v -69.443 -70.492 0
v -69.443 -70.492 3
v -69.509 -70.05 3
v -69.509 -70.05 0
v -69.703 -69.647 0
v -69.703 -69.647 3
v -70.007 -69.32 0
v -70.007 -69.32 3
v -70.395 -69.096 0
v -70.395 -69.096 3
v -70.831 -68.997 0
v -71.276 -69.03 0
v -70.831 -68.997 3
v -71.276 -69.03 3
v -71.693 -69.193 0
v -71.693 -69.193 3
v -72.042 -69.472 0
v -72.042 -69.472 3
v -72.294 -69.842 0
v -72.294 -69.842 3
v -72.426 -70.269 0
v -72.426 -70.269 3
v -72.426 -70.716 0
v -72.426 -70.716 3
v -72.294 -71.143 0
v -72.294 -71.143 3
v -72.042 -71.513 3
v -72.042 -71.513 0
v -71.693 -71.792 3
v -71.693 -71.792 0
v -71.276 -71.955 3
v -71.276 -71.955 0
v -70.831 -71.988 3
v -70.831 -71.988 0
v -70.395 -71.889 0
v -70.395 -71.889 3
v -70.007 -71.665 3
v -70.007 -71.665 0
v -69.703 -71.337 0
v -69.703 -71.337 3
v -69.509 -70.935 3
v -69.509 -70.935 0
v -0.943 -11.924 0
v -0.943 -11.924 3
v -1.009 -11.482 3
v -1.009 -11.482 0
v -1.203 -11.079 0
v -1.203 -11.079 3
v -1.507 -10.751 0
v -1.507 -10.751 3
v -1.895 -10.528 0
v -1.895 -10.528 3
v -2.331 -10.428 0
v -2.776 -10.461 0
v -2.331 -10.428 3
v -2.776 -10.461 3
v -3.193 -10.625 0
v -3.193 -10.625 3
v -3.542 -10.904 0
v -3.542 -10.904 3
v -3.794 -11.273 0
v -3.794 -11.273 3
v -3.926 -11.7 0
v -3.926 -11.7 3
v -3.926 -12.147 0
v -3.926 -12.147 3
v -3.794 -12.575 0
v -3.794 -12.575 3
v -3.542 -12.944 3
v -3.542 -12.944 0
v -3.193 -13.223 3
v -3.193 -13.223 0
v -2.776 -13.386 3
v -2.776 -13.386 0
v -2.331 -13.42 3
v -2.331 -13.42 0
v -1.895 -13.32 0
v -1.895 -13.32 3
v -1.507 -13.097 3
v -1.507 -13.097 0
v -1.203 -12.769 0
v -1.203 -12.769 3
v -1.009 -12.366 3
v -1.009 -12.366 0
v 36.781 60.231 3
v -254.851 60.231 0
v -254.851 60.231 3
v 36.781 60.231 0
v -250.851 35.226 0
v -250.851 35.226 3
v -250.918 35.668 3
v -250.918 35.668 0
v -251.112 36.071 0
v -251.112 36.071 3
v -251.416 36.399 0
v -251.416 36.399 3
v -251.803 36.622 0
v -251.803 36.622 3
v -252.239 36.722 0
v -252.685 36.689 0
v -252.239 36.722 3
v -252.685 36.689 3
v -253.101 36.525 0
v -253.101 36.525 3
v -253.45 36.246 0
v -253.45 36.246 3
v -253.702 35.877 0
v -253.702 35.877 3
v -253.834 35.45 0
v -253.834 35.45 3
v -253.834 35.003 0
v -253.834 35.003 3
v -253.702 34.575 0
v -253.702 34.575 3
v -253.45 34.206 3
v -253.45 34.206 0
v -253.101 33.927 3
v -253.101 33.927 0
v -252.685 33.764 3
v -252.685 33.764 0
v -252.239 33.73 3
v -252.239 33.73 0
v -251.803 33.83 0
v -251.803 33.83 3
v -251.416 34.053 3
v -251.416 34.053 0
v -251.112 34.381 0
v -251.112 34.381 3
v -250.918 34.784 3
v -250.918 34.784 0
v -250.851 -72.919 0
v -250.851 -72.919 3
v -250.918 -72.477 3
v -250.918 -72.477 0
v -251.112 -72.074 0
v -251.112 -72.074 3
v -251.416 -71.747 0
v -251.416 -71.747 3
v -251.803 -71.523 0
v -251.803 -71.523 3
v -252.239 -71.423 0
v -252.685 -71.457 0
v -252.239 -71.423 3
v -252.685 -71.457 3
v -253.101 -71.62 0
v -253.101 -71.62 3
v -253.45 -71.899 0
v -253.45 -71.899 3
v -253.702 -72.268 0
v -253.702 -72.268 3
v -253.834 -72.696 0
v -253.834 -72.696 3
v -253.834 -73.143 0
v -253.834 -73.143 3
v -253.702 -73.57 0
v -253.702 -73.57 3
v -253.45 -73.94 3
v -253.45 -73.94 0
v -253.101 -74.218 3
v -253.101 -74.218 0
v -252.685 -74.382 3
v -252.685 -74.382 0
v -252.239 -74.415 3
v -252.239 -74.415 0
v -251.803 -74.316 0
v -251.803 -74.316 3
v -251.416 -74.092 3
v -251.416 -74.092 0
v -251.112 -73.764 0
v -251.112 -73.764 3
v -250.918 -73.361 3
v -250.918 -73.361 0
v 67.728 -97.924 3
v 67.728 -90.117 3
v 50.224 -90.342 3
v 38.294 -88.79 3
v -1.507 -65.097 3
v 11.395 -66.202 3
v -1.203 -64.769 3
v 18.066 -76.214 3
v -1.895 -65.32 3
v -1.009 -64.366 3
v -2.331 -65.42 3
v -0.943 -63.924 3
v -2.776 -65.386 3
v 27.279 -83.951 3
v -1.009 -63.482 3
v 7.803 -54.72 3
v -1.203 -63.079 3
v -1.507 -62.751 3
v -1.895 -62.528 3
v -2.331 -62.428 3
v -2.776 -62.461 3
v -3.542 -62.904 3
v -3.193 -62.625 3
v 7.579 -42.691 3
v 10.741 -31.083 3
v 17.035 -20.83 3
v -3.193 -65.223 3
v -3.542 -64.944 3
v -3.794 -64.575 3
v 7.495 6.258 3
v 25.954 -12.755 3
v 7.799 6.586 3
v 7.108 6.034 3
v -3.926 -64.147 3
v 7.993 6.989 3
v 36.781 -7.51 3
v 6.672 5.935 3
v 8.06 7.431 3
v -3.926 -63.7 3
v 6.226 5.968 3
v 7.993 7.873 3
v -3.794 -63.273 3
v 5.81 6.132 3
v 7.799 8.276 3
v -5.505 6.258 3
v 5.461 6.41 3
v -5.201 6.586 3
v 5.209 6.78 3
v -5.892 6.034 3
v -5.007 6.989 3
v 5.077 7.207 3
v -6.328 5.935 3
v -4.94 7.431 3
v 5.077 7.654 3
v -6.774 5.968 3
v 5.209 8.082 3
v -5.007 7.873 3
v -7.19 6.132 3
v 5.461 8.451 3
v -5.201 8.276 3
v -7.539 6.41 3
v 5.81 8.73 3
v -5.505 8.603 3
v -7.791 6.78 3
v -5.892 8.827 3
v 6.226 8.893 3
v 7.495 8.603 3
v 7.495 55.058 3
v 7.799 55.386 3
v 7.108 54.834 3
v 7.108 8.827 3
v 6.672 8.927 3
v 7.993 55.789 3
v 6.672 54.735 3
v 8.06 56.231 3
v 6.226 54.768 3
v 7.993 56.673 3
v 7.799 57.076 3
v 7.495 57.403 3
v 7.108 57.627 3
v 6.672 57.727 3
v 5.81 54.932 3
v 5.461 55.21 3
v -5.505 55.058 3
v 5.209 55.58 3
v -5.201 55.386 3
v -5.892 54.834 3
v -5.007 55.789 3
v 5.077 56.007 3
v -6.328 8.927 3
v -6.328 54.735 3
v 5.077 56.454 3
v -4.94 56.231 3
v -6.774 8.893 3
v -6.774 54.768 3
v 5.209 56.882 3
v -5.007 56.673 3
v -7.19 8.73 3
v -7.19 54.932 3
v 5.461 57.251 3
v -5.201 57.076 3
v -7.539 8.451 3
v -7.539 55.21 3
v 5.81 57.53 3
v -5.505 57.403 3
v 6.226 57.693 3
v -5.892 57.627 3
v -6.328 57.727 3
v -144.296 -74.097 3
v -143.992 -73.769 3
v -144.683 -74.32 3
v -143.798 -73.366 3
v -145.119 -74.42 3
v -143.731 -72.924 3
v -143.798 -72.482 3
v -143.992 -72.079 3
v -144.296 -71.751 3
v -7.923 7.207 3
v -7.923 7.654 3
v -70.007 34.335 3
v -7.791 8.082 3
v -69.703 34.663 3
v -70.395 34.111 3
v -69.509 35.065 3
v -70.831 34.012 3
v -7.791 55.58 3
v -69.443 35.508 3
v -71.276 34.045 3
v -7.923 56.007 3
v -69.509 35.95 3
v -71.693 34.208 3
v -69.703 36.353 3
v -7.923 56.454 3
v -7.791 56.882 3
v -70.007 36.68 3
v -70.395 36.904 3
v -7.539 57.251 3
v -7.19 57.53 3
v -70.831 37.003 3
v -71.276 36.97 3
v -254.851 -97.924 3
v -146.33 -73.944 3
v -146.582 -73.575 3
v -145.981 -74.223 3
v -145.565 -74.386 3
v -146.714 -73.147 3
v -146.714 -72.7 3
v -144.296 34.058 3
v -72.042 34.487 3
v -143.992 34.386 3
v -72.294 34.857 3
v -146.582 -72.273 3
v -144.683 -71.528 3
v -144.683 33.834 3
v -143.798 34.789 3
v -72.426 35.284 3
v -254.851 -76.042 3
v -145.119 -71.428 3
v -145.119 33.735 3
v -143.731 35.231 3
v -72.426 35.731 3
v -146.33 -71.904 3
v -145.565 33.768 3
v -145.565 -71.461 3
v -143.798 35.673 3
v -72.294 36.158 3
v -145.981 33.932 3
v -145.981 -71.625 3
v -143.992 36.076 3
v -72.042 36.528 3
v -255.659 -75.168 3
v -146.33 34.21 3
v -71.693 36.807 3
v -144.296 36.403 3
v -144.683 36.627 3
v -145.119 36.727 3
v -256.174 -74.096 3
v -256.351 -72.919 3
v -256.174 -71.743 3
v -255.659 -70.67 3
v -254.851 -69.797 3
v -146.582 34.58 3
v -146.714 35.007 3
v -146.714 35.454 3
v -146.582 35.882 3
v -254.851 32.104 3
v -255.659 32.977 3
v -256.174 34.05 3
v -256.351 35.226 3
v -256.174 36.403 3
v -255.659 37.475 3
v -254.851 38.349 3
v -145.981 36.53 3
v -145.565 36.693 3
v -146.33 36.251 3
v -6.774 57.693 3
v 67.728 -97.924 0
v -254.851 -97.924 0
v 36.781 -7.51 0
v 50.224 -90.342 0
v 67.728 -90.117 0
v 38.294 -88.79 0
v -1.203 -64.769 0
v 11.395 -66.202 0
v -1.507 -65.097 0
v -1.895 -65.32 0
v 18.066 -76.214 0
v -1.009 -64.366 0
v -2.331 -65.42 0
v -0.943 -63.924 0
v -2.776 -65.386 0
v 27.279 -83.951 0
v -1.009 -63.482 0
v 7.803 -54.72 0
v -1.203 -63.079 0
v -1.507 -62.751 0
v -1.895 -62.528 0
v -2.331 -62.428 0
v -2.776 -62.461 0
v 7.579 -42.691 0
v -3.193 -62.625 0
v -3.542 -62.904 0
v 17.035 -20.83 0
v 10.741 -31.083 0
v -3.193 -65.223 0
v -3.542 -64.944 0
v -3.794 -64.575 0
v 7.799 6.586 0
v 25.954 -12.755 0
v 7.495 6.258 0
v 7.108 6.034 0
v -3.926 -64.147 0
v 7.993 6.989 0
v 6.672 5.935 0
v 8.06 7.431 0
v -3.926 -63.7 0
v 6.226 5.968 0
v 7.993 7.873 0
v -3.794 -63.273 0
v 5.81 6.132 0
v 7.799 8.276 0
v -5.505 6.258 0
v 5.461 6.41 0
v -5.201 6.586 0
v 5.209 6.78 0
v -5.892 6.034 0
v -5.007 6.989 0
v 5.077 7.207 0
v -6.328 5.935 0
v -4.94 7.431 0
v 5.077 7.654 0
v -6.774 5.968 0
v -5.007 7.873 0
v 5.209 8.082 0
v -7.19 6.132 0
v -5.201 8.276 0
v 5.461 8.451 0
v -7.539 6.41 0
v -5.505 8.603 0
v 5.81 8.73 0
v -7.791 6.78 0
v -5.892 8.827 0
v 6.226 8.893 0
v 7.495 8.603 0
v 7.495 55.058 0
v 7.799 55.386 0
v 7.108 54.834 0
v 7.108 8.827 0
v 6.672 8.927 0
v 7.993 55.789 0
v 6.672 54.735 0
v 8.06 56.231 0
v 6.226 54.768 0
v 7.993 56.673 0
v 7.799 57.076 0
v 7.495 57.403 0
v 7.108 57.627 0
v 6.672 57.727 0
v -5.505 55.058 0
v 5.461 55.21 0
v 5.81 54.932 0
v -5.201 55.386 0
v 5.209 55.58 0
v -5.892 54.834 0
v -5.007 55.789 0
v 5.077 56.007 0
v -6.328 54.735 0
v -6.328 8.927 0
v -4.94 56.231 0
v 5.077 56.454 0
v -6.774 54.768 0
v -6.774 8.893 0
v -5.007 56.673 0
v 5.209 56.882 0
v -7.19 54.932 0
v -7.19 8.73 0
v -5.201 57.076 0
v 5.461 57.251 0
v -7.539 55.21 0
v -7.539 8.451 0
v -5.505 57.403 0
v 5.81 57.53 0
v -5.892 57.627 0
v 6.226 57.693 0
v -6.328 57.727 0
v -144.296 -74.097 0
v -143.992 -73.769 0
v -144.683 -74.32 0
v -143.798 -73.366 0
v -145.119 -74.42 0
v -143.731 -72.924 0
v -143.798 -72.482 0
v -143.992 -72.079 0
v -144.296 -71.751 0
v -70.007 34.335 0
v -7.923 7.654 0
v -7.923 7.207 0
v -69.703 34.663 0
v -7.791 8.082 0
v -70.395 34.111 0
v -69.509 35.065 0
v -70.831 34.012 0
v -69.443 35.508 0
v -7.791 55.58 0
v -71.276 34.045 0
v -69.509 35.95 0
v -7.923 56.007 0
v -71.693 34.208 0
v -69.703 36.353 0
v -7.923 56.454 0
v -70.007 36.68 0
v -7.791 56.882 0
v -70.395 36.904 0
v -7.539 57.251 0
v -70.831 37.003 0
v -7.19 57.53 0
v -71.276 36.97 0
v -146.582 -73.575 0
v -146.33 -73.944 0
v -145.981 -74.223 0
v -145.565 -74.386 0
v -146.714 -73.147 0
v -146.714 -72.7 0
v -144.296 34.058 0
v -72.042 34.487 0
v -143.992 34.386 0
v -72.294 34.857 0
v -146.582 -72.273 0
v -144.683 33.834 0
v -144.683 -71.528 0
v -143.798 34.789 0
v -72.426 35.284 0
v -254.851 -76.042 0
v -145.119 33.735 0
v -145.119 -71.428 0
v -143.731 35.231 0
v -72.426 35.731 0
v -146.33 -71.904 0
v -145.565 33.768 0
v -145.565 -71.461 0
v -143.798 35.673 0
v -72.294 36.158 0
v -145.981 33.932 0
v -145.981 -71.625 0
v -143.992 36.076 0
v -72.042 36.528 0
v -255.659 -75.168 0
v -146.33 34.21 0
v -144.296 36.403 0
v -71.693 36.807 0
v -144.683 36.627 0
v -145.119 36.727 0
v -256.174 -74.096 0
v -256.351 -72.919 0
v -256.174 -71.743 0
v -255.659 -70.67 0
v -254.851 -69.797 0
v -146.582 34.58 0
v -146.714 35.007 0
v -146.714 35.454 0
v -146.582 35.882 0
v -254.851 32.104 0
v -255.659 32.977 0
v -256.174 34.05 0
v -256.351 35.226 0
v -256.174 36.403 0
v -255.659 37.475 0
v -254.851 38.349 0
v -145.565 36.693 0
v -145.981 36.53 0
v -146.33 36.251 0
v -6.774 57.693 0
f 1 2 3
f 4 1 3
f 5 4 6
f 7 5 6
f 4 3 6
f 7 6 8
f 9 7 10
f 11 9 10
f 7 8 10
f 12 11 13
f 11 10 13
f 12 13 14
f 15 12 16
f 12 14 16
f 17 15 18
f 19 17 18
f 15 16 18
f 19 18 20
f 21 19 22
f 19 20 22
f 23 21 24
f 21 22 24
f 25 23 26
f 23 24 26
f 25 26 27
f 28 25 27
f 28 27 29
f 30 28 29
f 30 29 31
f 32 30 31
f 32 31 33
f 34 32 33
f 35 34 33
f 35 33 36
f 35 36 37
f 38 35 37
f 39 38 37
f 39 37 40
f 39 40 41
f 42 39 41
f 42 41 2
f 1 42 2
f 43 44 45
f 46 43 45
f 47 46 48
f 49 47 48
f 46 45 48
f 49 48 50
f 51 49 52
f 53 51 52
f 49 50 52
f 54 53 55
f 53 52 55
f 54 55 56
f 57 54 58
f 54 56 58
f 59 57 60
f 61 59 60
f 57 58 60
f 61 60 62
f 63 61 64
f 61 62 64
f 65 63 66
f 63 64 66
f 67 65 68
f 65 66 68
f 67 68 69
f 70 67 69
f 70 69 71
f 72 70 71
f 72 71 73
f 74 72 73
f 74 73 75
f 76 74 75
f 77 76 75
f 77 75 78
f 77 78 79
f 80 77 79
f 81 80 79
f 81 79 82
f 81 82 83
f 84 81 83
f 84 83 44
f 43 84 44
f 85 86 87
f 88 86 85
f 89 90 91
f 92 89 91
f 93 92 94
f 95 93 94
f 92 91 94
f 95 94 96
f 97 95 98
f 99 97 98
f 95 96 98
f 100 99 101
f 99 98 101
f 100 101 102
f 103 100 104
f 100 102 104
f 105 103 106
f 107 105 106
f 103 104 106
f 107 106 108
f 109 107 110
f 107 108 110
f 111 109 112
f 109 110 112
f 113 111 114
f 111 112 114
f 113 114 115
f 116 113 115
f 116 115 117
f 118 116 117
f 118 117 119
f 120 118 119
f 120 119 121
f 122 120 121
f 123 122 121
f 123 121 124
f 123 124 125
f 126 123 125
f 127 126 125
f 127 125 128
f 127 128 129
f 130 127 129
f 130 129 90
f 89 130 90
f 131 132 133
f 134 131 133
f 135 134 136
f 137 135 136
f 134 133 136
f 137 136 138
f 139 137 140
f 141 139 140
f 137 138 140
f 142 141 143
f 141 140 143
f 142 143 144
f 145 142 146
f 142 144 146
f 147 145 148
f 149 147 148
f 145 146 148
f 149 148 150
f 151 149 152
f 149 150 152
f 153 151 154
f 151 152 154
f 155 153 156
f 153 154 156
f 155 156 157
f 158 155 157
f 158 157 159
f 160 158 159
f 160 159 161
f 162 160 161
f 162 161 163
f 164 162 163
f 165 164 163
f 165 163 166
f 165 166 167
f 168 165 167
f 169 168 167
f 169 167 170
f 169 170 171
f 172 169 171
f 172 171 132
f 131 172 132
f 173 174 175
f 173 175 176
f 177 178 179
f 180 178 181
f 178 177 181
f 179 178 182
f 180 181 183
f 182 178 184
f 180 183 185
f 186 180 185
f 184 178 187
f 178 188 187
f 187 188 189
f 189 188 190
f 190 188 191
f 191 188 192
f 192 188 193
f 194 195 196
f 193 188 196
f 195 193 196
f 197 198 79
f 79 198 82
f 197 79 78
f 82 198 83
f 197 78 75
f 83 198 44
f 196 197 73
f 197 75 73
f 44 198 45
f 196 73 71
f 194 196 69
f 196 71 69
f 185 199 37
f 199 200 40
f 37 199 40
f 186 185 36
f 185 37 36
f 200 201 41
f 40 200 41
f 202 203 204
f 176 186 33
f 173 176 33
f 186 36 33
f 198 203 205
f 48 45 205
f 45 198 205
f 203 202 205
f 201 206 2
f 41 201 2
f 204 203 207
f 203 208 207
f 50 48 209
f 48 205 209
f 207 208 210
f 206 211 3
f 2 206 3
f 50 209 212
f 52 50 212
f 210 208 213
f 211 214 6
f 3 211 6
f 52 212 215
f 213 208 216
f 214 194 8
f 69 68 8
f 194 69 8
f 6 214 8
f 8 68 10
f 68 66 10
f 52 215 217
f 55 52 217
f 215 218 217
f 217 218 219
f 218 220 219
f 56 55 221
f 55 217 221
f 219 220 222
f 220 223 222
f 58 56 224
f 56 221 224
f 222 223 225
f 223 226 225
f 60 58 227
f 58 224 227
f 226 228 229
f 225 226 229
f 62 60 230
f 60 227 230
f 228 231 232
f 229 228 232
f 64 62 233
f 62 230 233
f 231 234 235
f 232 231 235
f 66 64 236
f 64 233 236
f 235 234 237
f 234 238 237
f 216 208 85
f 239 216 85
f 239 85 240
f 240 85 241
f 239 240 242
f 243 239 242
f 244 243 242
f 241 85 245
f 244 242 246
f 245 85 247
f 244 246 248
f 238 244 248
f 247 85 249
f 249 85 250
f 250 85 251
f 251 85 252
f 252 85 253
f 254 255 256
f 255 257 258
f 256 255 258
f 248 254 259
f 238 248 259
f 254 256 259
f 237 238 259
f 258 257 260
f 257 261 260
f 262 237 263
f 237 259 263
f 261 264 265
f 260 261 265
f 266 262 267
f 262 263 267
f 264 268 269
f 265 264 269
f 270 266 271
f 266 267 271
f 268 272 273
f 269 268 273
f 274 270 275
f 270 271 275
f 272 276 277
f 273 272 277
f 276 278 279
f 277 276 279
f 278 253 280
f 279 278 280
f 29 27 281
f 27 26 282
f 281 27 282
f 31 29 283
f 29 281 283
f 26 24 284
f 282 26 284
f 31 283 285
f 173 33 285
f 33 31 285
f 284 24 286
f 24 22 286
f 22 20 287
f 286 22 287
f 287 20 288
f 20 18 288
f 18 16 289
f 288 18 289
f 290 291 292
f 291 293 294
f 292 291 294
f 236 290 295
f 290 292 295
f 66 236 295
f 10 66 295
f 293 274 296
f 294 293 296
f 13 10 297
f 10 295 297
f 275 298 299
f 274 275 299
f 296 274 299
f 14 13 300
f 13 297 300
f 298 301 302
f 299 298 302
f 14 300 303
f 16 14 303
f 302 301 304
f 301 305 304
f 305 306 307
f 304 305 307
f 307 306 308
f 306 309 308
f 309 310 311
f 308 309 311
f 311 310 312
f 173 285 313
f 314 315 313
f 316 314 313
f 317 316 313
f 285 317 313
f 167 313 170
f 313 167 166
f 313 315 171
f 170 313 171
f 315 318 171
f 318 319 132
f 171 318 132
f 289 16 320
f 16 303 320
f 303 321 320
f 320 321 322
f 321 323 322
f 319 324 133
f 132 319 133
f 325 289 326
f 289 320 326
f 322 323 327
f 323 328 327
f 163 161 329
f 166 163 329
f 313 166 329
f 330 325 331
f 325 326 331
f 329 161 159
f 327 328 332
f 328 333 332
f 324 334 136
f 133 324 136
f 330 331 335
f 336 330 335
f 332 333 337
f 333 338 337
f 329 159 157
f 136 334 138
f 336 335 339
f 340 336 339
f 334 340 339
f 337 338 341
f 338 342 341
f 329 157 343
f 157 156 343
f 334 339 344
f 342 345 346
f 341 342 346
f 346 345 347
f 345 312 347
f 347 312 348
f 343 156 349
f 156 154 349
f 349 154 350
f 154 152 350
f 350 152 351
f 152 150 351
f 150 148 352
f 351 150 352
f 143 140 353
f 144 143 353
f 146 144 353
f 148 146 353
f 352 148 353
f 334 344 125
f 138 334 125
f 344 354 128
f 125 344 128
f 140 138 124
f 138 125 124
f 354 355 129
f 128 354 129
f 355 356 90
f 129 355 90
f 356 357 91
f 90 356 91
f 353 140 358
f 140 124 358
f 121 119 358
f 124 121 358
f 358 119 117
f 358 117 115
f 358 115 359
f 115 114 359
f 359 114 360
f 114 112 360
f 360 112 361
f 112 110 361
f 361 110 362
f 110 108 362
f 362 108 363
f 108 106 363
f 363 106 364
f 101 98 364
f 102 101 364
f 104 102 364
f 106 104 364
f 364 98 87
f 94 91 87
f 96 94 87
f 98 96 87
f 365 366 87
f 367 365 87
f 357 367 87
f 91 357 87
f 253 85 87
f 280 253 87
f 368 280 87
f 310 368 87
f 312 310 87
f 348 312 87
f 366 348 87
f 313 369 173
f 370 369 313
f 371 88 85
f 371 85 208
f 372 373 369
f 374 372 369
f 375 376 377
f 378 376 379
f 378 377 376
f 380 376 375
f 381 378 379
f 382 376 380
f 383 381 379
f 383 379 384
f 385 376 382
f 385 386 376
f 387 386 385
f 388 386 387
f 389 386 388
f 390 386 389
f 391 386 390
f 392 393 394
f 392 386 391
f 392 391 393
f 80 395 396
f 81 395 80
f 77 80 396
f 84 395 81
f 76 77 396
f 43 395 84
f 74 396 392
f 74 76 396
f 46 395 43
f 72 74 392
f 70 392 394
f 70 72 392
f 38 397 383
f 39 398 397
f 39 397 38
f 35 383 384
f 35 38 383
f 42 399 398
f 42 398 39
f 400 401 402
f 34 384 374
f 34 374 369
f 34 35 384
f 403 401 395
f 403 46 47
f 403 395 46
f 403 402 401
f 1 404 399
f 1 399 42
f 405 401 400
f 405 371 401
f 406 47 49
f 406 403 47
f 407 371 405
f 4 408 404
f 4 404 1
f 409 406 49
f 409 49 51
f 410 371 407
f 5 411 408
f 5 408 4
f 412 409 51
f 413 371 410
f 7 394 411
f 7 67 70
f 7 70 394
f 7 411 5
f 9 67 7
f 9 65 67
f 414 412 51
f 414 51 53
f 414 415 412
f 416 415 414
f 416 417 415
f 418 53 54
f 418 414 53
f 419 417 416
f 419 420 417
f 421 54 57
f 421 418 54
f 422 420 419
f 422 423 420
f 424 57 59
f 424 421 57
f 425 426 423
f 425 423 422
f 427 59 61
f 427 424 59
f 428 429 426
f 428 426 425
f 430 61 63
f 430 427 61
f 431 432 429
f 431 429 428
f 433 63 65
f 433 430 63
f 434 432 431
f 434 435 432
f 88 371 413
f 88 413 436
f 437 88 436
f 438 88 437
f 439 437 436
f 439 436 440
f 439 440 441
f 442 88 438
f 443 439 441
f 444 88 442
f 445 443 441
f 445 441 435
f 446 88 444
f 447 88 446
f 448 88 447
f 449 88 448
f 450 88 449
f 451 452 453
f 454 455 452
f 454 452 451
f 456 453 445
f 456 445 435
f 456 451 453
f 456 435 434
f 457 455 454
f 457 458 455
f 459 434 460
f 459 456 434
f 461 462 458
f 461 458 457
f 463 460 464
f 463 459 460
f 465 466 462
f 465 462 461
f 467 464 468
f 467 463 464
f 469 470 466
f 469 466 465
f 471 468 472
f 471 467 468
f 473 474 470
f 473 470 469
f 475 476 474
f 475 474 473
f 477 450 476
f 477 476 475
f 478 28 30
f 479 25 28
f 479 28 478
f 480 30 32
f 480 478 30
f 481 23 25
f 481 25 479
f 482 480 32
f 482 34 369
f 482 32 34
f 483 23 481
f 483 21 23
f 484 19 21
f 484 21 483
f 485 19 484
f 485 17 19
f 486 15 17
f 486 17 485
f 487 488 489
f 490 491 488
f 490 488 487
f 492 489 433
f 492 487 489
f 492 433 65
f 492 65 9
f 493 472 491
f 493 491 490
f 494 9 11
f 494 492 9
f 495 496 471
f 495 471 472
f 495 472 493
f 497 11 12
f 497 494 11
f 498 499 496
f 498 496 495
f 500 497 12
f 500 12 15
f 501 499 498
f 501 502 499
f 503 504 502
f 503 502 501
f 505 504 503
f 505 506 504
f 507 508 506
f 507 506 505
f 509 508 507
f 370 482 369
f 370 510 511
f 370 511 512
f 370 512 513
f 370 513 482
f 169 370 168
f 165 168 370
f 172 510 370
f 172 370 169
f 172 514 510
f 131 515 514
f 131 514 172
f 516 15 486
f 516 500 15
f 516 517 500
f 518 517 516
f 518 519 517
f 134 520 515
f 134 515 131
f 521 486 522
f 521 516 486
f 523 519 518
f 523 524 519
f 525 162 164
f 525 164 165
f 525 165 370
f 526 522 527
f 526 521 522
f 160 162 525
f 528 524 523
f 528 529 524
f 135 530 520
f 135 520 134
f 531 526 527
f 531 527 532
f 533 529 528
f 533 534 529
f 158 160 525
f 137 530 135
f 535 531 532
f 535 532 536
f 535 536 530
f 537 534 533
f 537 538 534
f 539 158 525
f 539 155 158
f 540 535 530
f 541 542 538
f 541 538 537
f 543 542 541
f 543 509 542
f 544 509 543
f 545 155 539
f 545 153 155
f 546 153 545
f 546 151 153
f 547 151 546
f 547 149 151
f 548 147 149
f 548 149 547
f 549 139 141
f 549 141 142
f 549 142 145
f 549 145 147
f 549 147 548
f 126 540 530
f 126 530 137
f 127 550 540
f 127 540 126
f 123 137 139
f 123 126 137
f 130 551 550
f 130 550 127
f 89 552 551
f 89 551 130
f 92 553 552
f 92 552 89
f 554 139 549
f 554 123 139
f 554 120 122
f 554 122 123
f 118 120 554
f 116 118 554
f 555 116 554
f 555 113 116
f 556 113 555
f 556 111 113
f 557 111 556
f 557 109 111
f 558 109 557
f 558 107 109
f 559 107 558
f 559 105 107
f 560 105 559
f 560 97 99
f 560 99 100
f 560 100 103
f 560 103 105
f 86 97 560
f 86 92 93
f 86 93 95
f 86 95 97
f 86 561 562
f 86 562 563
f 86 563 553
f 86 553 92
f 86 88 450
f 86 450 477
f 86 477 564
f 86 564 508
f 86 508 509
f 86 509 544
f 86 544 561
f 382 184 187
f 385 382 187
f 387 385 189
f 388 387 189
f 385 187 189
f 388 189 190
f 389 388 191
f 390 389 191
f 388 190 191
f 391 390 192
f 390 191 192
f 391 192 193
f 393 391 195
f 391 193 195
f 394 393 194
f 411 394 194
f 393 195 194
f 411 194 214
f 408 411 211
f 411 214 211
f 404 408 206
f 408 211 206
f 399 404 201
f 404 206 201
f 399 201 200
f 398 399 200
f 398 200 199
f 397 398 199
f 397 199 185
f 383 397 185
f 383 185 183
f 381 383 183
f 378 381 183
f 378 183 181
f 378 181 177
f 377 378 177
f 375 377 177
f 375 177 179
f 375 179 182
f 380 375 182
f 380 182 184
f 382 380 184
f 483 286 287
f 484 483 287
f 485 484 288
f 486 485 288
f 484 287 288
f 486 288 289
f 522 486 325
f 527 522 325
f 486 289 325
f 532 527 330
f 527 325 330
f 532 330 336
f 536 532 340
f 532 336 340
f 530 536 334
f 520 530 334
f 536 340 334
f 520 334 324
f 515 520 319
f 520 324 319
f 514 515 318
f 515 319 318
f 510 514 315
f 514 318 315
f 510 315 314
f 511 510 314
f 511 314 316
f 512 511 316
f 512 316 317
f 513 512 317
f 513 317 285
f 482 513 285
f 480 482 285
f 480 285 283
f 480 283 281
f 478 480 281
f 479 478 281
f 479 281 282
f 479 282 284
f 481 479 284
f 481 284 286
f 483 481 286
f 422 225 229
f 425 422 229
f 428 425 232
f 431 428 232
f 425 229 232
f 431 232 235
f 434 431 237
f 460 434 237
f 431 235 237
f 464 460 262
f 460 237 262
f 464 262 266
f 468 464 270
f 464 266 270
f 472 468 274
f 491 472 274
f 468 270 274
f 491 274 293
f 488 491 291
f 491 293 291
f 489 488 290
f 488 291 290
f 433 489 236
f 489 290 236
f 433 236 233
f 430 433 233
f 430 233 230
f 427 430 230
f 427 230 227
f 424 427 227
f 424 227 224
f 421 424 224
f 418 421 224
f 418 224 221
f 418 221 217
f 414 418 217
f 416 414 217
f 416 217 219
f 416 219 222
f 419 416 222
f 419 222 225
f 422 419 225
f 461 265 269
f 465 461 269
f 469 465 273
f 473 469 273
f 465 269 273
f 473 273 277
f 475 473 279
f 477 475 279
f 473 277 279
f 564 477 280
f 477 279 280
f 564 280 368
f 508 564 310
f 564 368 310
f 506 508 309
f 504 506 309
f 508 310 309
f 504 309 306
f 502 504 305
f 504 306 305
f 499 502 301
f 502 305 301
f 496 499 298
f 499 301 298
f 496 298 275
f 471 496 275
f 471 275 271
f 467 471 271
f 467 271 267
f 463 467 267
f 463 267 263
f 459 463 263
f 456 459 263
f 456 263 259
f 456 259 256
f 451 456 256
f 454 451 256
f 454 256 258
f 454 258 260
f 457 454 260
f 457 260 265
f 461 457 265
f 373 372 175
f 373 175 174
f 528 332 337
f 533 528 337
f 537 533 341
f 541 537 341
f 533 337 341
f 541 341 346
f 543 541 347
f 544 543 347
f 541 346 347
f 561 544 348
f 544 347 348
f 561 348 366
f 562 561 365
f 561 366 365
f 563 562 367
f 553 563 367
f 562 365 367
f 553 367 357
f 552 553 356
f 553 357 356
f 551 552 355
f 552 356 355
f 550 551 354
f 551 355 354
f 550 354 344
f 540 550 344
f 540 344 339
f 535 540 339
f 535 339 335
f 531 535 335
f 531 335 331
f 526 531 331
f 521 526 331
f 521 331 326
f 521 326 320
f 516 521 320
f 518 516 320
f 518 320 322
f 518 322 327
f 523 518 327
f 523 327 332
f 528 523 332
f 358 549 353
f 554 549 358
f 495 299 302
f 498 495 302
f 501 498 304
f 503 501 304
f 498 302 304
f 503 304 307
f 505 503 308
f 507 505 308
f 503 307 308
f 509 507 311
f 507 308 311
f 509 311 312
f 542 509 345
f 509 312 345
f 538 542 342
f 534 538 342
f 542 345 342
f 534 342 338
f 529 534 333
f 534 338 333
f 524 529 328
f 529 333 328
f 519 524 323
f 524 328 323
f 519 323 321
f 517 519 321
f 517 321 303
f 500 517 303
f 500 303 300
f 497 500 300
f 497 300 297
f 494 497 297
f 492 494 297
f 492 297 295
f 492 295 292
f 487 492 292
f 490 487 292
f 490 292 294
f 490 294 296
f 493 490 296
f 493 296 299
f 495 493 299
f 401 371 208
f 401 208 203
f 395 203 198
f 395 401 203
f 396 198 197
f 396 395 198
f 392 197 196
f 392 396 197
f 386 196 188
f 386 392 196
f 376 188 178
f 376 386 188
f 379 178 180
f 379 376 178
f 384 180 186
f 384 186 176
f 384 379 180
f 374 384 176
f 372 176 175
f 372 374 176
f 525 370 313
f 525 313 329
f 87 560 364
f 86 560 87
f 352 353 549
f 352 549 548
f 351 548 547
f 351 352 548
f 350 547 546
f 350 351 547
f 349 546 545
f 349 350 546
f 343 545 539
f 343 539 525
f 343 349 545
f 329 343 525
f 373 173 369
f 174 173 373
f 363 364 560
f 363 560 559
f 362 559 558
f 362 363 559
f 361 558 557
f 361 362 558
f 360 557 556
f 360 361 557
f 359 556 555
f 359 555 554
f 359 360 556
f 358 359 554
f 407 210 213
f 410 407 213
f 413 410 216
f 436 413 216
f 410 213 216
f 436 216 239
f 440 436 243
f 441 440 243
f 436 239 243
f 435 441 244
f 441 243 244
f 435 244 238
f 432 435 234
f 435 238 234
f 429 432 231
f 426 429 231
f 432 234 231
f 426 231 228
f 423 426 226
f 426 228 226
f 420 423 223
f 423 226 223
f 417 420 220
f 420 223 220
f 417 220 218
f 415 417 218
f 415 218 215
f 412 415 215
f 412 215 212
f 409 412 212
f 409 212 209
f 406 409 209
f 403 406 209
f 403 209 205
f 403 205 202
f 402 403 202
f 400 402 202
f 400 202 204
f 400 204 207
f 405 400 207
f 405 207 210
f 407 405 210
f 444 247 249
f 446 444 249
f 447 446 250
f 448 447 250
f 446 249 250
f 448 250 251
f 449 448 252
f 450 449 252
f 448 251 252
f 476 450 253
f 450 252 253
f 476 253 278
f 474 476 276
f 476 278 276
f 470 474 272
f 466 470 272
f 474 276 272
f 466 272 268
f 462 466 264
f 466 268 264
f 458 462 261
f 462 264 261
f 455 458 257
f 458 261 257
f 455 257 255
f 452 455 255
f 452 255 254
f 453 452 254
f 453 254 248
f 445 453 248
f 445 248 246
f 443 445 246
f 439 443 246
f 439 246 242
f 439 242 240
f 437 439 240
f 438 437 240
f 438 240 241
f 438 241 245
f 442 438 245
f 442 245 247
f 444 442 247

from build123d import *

# Parameters (mm, degrees)
BOSS_EXTRUDE1_DEPTH = 3
CUT_EXTRUDE1_DEPTH  = 3
SKETCH10_R          = 1.5
CUT_EXTRUDE2_DEPTH  = 4
SKETCH11_R          = 1.5
CUT_EXTRUDE3_DEPTH  = 4
SKETCH12_R          = 1.5
CUT_EXTRUDE4_DEPTH  = 10
SKETCH13_R          = 1.5
CUT_EXTRUDE5_DEPTH  = 10
SKETCH15_R          = 1.5
CUT_EXTRUDE6_DEPTH  = 10
SKETCH16_R          = 4
SKETCH16_R_2        = 1.5
BOSS_EXTRUDE3_DEPTH = 3


with BuildPart() as part:
    # Sketch1 → Boss-Extrude1 (new body)
    with BuildSketch(Plane.XY):
        with BuildLine():
            Line((-254.850919962, 60.230742329), (36.781104638, 60.230742329))
            Line((36.781104638, 60.230742329), (36.781104638, -7.509642512))
            ThreePointArc((36.781104638, -7.509642512), (7.803285657, -54.719658484), (50.224189815, -90.342214419))
            Line((50.224189815, -90.342214419), (82.677328038, -89.923825571))
            Line((82.677328038, -89.923825571), (82.677328038, -97.923825571))
            Line((82.677328038, -97.923825571), (-254.850919962, -97.923825571))
            Line((-254.850919962, -97.923825571), (-254.850919962, 60.230742329))
        make_face()
    extrude(amount=BOSS_EXTRUDE1_DEPTH)

    # Sketch3 → Cut-Extrude1 (cut)
    with BuildSketch(Plane.XY.offset(3)):
        Polygon((67.728416495, -97.923825571), (67.728416495, -90.116548316), (82.677328038, -89.923825571), (82.677328038, -97.923825571), align=None)
    extrude(amount=-CUT_EXTRUDE1_DEPTH, mode=Mode.SUBTRACT)

    # Sketch10 → Cut-Extrude2 (cut)
    with BuildSketch(Plane.XY.offset(3)):
        with Locations((-2.442671962, -11.923825571)):
            Circle(SKETCH10_R)
        with Locations((-2.442671962, -63.923825571)):
            Circle(SKETCH10_R)
    extrude(amount=-CUT_EXTRUDE2_DEPTH, mode=Mode.SUBTRACT)

    # Sketch11 → Cut-Extrude3 (cut)
    with BuildSketch(Plane.XY.offset(3)):
        with Locations((-70.942671962, 35.507538029)):
            Circle(SKETCH11_R)
        with Locations((-70.942671962, -70.492461971)):
            Circle(SKETCH11_R)
    extrude(amount=-CUT_EXTRUDE3_DEPTH, mode=Mode.SUBTRACT)

    # Sketch12 → Cut-Extrude4 (cut)
    with BuildSketch(Plane.XY.offset(3)):
        with Locations((-6.43991594, 56.230742329)):
            Circle(SKETCH12_R)
        with Locations((6.56008406, 56.230742329)):
            Circle(SKETCH12_R)
        with Locations((6.56008406, 7.430742329)):
            Circle(SKETCH12_R)
        with Locations((-6.43991594, 7.430742329)):
            Circle(SKETCH12_R)
    extrude(amount=-CUT_EXTRUDE4_DEPTH, mode=Mode.SUBTRACT)

    # Sketch13 → Cut-Extrude5 (cut)
    with BuildSketch(Plane.XY.offset(3)):
        with Locations((-145.230919962, 35.230742329)):
            Circle(SKETCH13_R)
        with Locations((-145.230919962, -72.923825571)):
            Circle(SKETCH13_R)
    extrude(amount=-CUT_EXTRUDE5_DEPTH, mode=Mode.SUBTRACT)

    # Sketch15 → Cut-Extrude6 (cut)
    with BuildSketch(Plane.XY.offset(3)):
        with Locations((-252.350919962, -72.919257671)):
            Circle(SKETCH15_R)
        with Locations((-252.350919962, 35.226174429)):
            Circle(SKETCH15_R)
    extrude(amount=-CUT_EXTRUDE6_DEPTH, mode=Mode.SUBTRACT)

    # Sketch16 → Boss-Extrude3 (add)
    # profile 1 of 2: a face of its own
    with BuildSketch(Plane.XY.offset(3)):
        with Locations((-252.350919962, -72.919257671)):
            Circle(SKETCH16_R)
        with Locations((-252.350919962, -72.919257671)):
            Circle(SKETCH16_R_2, mode=Mode.SUBTRACT)
    # profile 2 of 2: a face of its own
    with BuildSketch(Plane.XY.offset(3)):
        with Locations((-252.350919962, 35.226174429)):
            Circle(SKETCH16_R)
        with Locations((-252.350919962, 35.226174429)):
            Circle(SKETCH16_R_2, mode=Mode.SUBTRACT)
    extrude(amount=-BOSS_EXTRUDE3_DEPTH)


solid = part.part
